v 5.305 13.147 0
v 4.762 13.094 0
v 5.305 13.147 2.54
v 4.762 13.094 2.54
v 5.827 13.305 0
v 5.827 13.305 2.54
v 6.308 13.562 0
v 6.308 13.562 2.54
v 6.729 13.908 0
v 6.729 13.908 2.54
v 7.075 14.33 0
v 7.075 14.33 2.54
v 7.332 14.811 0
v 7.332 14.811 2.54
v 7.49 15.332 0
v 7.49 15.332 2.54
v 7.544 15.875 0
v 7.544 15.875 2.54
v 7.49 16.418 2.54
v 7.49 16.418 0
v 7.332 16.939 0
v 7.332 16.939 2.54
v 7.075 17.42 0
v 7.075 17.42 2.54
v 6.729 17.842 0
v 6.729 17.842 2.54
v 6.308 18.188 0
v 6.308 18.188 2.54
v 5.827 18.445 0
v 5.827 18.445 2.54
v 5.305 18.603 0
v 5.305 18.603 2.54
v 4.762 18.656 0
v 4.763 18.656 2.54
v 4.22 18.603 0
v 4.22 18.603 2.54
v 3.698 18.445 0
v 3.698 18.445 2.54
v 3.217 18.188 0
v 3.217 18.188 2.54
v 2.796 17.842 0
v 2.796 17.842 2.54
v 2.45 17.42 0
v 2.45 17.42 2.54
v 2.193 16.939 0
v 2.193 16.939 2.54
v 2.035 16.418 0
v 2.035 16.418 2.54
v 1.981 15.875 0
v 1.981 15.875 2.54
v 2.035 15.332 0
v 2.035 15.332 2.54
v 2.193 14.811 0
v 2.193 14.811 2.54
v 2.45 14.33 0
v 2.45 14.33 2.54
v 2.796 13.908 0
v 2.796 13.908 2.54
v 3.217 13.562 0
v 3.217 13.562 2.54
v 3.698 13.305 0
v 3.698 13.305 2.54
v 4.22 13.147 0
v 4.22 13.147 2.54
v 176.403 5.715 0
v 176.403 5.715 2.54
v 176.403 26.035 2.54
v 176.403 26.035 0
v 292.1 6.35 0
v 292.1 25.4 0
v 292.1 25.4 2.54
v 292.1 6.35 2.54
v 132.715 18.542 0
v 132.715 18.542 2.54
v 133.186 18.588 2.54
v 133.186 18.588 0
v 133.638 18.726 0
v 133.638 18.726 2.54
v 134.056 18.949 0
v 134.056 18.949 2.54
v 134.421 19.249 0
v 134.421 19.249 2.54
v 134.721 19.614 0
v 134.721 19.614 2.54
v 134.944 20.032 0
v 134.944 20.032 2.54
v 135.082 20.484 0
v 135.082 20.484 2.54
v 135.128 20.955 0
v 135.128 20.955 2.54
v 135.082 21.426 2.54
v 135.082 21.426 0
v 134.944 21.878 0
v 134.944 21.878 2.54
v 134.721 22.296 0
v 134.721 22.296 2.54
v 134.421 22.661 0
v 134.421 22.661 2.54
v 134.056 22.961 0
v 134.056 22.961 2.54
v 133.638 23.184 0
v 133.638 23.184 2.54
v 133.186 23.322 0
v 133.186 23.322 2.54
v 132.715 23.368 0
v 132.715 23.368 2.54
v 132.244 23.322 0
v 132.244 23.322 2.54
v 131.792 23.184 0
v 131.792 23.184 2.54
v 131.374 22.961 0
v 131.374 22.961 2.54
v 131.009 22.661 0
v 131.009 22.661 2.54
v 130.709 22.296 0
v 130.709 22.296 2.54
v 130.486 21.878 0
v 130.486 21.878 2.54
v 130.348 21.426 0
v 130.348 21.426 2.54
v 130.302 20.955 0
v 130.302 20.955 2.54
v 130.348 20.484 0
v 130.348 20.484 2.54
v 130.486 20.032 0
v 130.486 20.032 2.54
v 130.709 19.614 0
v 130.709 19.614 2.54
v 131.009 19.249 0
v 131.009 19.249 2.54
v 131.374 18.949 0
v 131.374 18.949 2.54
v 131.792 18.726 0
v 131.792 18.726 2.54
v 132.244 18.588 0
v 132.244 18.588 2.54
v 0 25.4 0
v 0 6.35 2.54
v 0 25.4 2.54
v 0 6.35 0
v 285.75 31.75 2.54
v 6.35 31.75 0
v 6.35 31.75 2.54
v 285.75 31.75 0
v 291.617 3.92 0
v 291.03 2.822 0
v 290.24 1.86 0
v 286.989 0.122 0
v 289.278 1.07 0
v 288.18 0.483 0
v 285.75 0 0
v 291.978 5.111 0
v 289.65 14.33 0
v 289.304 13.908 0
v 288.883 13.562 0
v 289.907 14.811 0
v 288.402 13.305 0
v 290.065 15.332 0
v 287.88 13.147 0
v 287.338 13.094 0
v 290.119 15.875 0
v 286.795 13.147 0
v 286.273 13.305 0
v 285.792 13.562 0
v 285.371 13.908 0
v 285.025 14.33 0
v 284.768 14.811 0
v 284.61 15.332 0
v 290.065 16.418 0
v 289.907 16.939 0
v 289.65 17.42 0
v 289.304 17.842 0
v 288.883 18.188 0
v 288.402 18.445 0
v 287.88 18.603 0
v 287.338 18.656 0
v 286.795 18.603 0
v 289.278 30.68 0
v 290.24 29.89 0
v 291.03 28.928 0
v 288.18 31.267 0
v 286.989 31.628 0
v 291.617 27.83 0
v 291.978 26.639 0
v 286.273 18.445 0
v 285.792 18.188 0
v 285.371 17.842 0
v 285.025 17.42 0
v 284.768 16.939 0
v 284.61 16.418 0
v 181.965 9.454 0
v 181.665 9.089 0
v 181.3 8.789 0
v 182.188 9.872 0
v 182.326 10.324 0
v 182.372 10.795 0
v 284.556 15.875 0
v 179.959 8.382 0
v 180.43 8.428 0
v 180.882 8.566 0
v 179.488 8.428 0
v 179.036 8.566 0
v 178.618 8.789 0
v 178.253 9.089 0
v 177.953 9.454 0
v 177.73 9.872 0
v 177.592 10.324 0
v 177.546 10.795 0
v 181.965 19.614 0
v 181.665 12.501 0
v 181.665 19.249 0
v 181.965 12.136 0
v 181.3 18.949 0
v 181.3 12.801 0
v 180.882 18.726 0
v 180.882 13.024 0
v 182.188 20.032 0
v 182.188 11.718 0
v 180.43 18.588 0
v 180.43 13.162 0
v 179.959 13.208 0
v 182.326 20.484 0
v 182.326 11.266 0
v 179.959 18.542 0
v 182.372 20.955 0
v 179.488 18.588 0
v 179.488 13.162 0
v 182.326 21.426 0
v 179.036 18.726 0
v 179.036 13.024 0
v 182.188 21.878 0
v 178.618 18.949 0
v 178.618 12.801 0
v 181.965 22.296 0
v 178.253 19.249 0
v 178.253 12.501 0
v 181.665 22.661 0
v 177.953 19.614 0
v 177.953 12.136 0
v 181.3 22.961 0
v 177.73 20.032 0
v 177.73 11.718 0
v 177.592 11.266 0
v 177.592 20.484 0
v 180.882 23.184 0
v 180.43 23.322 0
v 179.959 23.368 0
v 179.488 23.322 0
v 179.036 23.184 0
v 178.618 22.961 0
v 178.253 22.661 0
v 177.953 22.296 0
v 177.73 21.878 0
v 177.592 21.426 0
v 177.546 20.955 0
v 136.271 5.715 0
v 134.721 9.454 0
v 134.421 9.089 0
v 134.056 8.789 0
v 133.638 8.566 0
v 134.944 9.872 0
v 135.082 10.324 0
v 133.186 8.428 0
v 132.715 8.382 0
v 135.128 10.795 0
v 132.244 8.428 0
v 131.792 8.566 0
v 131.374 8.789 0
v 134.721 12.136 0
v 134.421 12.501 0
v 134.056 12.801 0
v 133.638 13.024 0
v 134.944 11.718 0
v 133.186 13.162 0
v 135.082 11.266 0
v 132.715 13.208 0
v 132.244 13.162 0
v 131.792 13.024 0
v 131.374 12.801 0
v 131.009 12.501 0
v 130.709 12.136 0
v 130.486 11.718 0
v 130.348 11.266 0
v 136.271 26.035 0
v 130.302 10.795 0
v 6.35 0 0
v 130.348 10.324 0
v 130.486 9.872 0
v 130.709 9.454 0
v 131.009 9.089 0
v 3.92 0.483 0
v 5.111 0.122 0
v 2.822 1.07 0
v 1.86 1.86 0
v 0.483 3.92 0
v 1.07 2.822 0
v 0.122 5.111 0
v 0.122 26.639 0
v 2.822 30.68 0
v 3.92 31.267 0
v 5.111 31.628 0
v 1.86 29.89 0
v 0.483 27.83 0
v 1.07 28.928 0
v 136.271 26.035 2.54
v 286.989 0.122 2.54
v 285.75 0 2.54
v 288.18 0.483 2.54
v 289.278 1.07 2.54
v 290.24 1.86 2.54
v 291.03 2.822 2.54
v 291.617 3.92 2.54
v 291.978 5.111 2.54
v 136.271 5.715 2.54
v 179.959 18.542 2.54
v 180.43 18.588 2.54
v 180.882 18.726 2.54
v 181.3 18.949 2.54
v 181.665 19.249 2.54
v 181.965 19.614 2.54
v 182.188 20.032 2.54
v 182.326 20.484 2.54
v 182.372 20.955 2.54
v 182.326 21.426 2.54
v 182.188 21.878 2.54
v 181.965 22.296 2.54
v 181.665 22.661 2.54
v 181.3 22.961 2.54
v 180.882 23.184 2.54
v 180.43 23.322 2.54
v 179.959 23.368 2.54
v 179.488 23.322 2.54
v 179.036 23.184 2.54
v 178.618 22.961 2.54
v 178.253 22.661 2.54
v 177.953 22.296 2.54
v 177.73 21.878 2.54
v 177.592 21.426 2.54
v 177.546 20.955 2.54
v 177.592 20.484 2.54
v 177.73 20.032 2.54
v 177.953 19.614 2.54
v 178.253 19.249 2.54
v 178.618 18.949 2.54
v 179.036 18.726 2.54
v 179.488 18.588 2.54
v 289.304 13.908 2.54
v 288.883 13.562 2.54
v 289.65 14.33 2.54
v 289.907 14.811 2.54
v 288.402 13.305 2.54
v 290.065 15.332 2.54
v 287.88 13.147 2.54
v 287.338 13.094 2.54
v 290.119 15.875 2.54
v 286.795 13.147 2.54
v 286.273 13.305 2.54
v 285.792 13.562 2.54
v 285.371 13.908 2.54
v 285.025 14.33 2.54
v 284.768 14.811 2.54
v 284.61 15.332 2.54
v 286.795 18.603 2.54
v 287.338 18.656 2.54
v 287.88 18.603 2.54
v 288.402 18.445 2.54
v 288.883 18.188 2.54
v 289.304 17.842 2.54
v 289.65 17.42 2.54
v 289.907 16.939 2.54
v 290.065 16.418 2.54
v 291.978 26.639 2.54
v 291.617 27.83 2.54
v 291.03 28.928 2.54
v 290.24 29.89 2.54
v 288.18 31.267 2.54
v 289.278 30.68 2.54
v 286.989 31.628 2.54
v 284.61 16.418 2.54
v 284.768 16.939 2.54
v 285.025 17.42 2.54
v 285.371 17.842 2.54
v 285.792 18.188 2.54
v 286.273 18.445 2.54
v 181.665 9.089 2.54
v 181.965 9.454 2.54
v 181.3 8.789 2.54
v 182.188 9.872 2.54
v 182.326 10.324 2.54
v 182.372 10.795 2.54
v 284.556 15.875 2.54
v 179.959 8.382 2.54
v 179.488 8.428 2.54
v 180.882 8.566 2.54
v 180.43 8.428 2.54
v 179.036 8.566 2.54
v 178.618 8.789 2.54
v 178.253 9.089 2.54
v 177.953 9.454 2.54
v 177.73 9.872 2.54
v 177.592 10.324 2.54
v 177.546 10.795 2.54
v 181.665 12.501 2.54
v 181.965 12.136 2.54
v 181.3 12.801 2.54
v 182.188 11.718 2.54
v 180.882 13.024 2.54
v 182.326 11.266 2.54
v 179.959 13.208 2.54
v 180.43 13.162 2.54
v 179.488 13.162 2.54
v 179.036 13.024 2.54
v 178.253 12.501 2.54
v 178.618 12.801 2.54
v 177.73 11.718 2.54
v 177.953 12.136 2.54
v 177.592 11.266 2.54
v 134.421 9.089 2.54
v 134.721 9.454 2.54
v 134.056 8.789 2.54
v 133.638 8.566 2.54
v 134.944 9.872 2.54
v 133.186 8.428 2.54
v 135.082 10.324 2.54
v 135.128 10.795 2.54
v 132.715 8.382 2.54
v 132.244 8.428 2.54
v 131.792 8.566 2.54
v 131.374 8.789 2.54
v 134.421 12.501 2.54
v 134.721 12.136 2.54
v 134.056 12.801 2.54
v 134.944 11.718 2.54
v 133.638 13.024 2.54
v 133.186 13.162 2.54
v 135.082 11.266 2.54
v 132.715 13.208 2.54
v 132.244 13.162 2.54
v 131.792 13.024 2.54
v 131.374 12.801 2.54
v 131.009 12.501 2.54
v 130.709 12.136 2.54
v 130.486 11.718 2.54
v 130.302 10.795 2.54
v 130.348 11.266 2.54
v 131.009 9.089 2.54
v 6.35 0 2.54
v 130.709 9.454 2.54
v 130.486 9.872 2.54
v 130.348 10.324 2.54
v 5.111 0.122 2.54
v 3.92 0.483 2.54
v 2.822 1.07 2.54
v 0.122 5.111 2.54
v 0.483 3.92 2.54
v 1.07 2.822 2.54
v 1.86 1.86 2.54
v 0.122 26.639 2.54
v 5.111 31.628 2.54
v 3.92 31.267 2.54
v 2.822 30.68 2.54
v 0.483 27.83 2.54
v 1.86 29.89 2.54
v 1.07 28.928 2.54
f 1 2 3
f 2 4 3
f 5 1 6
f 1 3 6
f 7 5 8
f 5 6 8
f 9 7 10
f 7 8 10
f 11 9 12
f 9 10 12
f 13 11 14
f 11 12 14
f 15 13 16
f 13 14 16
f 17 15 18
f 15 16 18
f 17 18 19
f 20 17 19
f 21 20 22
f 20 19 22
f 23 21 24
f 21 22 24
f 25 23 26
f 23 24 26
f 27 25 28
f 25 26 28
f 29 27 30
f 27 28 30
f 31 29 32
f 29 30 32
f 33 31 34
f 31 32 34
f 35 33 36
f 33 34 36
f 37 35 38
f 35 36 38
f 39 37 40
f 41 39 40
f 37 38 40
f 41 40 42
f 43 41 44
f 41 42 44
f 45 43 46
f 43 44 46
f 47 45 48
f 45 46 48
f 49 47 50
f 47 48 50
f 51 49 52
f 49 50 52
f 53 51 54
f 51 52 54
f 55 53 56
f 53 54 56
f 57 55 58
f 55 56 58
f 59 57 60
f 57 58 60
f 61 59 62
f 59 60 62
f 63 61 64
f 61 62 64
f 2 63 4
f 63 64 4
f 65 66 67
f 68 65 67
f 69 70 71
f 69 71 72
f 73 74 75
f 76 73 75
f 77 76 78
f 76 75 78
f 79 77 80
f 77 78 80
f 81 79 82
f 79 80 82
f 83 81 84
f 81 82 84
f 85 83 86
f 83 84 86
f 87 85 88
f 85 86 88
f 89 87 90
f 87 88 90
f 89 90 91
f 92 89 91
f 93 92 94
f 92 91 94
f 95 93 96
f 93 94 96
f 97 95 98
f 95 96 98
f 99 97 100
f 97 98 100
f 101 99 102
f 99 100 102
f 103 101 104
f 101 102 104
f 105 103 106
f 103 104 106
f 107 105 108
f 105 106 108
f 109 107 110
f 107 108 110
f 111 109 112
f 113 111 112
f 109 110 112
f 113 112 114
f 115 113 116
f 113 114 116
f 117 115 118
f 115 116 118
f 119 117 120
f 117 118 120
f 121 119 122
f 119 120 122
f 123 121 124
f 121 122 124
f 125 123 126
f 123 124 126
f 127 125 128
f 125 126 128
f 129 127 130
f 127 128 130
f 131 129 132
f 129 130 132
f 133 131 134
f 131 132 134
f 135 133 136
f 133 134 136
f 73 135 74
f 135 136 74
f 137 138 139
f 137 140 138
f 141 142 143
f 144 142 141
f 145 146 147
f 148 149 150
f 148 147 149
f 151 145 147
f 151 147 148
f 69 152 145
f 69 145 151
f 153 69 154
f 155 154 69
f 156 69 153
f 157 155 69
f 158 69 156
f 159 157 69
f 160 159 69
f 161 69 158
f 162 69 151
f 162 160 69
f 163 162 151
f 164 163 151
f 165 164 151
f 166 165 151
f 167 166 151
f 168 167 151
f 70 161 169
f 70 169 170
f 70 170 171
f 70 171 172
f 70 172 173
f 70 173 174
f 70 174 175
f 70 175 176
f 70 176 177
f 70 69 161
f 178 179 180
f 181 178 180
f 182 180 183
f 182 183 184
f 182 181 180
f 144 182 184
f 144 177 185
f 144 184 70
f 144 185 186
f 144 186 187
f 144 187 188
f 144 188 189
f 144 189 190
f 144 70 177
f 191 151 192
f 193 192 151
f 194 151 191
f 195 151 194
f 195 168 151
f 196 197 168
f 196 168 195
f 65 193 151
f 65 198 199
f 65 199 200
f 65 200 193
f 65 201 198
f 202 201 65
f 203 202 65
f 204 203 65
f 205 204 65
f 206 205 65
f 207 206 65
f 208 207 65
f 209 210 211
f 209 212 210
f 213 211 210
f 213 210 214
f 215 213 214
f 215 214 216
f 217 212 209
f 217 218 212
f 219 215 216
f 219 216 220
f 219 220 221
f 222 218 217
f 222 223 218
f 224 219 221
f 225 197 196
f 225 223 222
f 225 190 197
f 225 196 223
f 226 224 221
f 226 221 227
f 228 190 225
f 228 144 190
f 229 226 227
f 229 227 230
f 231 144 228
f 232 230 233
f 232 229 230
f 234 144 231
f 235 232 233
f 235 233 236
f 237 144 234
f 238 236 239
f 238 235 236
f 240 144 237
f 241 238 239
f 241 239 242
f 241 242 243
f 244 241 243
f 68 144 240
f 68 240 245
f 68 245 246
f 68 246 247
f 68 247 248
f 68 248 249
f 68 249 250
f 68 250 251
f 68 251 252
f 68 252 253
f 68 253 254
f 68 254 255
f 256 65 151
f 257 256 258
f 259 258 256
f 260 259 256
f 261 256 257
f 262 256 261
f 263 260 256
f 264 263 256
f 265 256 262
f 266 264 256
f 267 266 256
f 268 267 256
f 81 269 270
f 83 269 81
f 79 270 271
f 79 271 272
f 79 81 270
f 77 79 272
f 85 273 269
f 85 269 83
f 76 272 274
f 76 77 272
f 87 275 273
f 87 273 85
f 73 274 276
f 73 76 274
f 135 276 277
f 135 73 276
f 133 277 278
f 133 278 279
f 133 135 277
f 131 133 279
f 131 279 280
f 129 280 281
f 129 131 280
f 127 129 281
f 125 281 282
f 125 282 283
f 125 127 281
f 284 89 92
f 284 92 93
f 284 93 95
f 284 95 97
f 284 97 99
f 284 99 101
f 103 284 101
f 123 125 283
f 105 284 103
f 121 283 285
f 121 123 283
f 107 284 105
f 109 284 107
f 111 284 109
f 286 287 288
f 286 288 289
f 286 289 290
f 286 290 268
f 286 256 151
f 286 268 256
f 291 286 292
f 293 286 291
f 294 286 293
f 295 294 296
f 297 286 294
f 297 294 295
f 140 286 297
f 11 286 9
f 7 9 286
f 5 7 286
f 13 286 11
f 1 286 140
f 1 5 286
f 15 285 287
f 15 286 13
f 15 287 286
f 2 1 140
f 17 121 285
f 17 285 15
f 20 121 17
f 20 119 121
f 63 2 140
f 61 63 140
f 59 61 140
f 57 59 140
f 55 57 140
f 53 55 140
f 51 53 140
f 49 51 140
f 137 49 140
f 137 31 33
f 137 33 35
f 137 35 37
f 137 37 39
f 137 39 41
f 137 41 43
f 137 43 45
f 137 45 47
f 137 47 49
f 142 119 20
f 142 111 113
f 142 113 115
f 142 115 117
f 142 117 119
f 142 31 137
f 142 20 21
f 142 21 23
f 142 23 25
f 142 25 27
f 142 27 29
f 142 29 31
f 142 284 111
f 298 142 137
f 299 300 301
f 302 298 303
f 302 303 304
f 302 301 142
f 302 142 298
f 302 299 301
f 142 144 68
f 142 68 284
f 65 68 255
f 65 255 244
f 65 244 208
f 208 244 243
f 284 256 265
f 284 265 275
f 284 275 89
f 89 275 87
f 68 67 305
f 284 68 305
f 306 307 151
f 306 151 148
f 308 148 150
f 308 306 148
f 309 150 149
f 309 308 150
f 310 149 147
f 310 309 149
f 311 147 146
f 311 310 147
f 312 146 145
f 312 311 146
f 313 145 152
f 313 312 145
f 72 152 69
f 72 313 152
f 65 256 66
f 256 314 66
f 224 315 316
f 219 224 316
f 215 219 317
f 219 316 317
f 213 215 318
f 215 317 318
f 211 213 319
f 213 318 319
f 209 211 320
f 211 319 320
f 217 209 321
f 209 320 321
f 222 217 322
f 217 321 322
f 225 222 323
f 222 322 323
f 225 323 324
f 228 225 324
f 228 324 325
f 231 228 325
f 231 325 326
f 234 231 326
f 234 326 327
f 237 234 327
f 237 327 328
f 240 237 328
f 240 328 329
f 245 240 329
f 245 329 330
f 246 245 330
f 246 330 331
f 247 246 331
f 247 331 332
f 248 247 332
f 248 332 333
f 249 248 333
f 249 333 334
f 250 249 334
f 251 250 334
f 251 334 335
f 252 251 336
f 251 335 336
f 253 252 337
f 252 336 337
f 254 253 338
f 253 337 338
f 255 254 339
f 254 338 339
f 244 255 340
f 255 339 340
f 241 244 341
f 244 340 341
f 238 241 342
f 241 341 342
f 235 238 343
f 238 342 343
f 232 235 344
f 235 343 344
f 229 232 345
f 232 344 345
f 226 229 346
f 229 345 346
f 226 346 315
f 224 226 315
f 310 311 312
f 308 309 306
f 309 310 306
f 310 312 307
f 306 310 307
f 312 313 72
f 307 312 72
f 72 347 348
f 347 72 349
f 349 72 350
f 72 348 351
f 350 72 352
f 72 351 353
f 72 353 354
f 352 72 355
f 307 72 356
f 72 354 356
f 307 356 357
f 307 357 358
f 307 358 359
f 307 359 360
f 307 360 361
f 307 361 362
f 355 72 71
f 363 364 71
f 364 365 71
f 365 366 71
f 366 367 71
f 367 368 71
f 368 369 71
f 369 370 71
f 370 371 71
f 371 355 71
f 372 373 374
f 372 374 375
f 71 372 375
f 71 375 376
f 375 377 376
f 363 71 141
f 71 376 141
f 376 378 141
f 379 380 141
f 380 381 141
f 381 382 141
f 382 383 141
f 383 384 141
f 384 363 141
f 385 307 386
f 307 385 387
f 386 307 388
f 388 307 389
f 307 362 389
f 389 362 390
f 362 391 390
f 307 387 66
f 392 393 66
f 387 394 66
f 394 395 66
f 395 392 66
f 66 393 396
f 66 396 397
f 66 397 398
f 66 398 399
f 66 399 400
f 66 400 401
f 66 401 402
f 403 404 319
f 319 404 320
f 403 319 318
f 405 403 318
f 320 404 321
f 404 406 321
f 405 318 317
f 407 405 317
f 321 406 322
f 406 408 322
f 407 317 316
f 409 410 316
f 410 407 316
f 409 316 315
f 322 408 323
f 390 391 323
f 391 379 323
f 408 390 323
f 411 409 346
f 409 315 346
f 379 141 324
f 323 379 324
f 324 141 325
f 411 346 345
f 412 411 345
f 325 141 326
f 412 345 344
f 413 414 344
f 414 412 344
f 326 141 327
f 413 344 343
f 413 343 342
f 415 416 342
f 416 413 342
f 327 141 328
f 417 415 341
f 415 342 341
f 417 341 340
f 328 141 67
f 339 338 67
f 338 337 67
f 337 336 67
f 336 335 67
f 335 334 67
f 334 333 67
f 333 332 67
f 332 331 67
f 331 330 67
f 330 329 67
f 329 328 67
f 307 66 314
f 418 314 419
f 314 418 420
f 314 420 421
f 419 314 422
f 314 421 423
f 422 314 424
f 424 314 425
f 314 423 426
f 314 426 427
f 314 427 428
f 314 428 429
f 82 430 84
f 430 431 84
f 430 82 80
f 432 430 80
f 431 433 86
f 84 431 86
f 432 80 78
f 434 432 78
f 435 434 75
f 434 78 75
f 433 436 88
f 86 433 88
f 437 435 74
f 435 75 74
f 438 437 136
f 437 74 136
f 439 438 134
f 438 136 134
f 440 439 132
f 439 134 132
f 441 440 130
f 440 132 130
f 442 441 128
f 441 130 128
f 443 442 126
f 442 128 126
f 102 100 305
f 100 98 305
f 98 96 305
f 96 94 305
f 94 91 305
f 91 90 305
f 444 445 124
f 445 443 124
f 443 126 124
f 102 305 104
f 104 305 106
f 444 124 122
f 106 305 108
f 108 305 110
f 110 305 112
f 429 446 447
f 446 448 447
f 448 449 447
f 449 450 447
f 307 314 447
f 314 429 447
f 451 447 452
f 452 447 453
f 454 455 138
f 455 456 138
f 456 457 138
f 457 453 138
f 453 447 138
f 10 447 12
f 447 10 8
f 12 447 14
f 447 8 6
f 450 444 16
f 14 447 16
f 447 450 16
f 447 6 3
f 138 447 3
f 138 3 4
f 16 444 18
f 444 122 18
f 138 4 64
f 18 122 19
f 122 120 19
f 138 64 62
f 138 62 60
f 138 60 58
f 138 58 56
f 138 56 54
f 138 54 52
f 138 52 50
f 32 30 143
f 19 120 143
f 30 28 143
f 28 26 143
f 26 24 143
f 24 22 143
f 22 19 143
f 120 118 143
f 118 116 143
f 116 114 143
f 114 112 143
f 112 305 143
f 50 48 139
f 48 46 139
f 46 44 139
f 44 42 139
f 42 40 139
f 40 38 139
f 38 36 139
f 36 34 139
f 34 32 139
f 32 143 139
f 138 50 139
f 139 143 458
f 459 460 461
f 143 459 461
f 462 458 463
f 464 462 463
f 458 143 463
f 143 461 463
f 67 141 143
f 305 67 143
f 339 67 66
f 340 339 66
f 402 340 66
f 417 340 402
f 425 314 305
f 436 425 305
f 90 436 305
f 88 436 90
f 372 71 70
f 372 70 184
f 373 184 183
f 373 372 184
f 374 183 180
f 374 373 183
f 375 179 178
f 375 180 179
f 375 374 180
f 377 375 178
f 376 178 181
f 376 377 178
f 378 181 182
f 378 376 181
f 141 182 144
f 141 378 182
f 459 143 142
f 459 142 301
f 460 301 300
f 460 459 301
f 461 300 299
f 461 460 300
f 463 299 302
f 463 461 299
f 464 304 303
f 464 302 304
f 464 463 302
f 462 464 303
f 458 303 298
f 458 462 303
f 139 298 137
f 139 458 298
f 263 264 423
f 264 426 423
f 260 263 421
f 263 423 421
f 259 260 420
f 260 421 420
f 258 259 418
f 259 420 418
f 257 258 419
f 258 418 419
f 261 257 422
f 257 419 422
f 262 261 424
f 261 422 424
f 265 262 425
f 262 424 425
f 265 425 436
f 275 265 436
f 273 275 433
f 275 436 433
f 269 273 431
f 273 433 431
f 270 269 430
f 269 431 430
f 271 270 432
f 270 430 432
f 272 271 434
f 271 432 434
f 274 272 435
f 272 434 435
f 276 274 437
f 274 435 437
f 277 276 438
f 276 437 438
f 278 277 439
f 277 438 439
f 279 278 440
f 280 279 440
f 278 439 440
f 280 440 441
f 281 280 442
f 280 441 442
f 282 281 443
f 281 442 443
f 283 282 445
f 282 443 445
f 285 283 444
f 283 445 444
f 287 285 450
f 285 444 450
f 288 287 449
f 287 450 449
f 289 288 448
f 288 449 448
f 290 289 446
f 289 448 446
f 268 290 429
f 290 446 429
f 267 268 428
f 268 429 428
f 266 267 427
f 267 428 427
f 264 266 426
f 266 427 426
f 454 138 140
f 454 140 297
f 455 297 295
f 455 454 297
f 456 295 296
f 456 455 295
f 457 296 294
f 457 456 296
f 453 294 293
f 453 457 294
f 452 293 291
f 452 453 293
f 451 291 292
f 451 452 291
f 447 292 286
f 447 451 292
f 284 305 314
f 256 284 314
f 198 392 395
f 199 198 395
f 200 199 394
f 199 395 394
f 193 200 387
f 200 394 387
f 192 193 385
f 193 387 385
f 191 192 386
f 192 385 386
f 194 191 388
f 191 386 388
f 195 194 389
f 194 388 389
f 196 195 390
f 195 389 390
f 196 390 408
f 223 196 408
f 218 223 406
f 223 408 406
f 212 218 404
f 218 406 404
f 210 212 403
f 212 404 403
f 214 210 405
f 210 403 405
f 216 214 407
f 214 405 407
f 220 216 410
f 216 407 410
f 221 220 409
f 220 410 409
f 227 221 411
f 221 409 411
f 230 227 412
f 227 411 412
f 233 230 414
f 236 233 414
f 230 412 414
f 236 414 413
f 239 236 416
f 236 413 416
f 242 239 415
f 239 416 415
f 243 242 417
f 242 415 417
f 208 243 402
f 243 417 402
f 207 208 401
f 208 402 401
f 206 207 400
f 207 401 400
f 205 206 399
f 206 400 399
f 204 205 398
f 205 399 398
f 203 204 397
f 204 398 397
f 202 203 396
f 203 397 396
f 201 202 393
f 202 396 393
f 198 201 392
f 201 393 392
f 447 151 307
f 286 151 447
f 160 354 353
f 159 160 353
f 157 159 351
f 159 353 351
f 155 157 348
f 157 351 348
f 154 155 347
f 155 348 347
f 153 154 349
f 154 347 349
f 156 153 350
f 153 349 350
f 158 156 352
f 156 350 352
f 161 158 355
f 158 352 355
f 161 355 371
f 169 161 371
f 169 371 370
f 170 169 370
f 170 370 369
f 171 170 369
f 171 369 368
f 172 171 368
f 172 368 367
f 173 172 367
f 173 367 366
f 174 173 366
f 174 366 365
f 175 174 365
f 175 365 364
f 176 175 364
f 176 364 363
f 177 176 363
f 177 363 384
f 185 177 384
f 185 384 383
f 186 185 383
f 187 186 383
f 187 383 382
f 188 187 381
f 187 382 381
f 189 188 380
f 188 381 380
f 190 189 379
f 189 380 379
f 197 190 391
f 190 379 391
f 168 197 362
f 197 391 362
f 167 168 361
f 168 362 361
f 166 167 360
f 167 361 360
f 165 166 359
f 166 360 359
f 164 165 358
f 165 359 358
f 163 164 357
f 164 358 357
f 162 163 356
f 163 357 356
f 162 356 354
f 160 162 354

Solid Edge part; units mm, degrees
sketch "Sketch1" plane through (0, 0, 0) normal (0, 0, 1) x (1, 0, 0)
  line L0 (0, 0) -> (0, 31.75)
  line L1 (0, 31.75) -> (292.1, 31.75)
  line L2 (292.1, 31.75) -> (292.1, 0)
  line L3 (292.1, 0) -> (0, 0)
  dimension "D1" = 292.1
  dimension "D2" = 31.75
extrude "Protrusion1" add sketch "Sketch1" along normal blind 2.54
hole "Hole_1" at (287.3375, 15.875, 2.54) direction (0, 0, -1) diameter 5.5626 end up to next
hole "Hole1" at (4.7625, 15.875, 2.54) direction (0, 0, -1) diameter 5.5626 end up to next
fillet "Round_1" radius 6.35 4 edges at (0, 0, 1.27) (0, 31.75, 1.27) (292.1, 31.75, 1.27) (292.1, 0, 1.27)
sketch "Sketch2" plane through (146.05, 25.4, 2.54) normal (0, 0, 1) x (1, 0, 0)
  line L0 (-9.779, 0.635) -> (-9.779, -19.685)
  line L1 (-9.779, -19.685) -> (30.353, -19.685)
  line L2 (30.353, -19.685) -> (30.353, 0.635)
  line L3 (30.353, 0.635) -> (-9.779, 0.635)
  dimension "D1" = 40.132
  dimension "D2" = 20.32
  dimension "D3" = 9.779
  dimension "D4" = 10.16
  dimension "D5" = 9.779
extrude "Cutout1" cut sketch "Sketch2" against normal through all
hole "Hole2" at (179.959, 20.955, 2.54) direction (0, 0, -1) diameter 4.826 end through all
hole "Hole3" at (179.959, 10.795, 2.54) direction (0, 0, -1) diameter 4.826 end through all
hole "Hole4" at (132.715, 10.795, 2.54) direction (0, 0, -1) diameter 4.826 end through all
hole "Hole5" at (132.715, 20.955, 2.54) direction (0, 0, -1) diameter 4.826 end through all
properties part number "SR-04"
